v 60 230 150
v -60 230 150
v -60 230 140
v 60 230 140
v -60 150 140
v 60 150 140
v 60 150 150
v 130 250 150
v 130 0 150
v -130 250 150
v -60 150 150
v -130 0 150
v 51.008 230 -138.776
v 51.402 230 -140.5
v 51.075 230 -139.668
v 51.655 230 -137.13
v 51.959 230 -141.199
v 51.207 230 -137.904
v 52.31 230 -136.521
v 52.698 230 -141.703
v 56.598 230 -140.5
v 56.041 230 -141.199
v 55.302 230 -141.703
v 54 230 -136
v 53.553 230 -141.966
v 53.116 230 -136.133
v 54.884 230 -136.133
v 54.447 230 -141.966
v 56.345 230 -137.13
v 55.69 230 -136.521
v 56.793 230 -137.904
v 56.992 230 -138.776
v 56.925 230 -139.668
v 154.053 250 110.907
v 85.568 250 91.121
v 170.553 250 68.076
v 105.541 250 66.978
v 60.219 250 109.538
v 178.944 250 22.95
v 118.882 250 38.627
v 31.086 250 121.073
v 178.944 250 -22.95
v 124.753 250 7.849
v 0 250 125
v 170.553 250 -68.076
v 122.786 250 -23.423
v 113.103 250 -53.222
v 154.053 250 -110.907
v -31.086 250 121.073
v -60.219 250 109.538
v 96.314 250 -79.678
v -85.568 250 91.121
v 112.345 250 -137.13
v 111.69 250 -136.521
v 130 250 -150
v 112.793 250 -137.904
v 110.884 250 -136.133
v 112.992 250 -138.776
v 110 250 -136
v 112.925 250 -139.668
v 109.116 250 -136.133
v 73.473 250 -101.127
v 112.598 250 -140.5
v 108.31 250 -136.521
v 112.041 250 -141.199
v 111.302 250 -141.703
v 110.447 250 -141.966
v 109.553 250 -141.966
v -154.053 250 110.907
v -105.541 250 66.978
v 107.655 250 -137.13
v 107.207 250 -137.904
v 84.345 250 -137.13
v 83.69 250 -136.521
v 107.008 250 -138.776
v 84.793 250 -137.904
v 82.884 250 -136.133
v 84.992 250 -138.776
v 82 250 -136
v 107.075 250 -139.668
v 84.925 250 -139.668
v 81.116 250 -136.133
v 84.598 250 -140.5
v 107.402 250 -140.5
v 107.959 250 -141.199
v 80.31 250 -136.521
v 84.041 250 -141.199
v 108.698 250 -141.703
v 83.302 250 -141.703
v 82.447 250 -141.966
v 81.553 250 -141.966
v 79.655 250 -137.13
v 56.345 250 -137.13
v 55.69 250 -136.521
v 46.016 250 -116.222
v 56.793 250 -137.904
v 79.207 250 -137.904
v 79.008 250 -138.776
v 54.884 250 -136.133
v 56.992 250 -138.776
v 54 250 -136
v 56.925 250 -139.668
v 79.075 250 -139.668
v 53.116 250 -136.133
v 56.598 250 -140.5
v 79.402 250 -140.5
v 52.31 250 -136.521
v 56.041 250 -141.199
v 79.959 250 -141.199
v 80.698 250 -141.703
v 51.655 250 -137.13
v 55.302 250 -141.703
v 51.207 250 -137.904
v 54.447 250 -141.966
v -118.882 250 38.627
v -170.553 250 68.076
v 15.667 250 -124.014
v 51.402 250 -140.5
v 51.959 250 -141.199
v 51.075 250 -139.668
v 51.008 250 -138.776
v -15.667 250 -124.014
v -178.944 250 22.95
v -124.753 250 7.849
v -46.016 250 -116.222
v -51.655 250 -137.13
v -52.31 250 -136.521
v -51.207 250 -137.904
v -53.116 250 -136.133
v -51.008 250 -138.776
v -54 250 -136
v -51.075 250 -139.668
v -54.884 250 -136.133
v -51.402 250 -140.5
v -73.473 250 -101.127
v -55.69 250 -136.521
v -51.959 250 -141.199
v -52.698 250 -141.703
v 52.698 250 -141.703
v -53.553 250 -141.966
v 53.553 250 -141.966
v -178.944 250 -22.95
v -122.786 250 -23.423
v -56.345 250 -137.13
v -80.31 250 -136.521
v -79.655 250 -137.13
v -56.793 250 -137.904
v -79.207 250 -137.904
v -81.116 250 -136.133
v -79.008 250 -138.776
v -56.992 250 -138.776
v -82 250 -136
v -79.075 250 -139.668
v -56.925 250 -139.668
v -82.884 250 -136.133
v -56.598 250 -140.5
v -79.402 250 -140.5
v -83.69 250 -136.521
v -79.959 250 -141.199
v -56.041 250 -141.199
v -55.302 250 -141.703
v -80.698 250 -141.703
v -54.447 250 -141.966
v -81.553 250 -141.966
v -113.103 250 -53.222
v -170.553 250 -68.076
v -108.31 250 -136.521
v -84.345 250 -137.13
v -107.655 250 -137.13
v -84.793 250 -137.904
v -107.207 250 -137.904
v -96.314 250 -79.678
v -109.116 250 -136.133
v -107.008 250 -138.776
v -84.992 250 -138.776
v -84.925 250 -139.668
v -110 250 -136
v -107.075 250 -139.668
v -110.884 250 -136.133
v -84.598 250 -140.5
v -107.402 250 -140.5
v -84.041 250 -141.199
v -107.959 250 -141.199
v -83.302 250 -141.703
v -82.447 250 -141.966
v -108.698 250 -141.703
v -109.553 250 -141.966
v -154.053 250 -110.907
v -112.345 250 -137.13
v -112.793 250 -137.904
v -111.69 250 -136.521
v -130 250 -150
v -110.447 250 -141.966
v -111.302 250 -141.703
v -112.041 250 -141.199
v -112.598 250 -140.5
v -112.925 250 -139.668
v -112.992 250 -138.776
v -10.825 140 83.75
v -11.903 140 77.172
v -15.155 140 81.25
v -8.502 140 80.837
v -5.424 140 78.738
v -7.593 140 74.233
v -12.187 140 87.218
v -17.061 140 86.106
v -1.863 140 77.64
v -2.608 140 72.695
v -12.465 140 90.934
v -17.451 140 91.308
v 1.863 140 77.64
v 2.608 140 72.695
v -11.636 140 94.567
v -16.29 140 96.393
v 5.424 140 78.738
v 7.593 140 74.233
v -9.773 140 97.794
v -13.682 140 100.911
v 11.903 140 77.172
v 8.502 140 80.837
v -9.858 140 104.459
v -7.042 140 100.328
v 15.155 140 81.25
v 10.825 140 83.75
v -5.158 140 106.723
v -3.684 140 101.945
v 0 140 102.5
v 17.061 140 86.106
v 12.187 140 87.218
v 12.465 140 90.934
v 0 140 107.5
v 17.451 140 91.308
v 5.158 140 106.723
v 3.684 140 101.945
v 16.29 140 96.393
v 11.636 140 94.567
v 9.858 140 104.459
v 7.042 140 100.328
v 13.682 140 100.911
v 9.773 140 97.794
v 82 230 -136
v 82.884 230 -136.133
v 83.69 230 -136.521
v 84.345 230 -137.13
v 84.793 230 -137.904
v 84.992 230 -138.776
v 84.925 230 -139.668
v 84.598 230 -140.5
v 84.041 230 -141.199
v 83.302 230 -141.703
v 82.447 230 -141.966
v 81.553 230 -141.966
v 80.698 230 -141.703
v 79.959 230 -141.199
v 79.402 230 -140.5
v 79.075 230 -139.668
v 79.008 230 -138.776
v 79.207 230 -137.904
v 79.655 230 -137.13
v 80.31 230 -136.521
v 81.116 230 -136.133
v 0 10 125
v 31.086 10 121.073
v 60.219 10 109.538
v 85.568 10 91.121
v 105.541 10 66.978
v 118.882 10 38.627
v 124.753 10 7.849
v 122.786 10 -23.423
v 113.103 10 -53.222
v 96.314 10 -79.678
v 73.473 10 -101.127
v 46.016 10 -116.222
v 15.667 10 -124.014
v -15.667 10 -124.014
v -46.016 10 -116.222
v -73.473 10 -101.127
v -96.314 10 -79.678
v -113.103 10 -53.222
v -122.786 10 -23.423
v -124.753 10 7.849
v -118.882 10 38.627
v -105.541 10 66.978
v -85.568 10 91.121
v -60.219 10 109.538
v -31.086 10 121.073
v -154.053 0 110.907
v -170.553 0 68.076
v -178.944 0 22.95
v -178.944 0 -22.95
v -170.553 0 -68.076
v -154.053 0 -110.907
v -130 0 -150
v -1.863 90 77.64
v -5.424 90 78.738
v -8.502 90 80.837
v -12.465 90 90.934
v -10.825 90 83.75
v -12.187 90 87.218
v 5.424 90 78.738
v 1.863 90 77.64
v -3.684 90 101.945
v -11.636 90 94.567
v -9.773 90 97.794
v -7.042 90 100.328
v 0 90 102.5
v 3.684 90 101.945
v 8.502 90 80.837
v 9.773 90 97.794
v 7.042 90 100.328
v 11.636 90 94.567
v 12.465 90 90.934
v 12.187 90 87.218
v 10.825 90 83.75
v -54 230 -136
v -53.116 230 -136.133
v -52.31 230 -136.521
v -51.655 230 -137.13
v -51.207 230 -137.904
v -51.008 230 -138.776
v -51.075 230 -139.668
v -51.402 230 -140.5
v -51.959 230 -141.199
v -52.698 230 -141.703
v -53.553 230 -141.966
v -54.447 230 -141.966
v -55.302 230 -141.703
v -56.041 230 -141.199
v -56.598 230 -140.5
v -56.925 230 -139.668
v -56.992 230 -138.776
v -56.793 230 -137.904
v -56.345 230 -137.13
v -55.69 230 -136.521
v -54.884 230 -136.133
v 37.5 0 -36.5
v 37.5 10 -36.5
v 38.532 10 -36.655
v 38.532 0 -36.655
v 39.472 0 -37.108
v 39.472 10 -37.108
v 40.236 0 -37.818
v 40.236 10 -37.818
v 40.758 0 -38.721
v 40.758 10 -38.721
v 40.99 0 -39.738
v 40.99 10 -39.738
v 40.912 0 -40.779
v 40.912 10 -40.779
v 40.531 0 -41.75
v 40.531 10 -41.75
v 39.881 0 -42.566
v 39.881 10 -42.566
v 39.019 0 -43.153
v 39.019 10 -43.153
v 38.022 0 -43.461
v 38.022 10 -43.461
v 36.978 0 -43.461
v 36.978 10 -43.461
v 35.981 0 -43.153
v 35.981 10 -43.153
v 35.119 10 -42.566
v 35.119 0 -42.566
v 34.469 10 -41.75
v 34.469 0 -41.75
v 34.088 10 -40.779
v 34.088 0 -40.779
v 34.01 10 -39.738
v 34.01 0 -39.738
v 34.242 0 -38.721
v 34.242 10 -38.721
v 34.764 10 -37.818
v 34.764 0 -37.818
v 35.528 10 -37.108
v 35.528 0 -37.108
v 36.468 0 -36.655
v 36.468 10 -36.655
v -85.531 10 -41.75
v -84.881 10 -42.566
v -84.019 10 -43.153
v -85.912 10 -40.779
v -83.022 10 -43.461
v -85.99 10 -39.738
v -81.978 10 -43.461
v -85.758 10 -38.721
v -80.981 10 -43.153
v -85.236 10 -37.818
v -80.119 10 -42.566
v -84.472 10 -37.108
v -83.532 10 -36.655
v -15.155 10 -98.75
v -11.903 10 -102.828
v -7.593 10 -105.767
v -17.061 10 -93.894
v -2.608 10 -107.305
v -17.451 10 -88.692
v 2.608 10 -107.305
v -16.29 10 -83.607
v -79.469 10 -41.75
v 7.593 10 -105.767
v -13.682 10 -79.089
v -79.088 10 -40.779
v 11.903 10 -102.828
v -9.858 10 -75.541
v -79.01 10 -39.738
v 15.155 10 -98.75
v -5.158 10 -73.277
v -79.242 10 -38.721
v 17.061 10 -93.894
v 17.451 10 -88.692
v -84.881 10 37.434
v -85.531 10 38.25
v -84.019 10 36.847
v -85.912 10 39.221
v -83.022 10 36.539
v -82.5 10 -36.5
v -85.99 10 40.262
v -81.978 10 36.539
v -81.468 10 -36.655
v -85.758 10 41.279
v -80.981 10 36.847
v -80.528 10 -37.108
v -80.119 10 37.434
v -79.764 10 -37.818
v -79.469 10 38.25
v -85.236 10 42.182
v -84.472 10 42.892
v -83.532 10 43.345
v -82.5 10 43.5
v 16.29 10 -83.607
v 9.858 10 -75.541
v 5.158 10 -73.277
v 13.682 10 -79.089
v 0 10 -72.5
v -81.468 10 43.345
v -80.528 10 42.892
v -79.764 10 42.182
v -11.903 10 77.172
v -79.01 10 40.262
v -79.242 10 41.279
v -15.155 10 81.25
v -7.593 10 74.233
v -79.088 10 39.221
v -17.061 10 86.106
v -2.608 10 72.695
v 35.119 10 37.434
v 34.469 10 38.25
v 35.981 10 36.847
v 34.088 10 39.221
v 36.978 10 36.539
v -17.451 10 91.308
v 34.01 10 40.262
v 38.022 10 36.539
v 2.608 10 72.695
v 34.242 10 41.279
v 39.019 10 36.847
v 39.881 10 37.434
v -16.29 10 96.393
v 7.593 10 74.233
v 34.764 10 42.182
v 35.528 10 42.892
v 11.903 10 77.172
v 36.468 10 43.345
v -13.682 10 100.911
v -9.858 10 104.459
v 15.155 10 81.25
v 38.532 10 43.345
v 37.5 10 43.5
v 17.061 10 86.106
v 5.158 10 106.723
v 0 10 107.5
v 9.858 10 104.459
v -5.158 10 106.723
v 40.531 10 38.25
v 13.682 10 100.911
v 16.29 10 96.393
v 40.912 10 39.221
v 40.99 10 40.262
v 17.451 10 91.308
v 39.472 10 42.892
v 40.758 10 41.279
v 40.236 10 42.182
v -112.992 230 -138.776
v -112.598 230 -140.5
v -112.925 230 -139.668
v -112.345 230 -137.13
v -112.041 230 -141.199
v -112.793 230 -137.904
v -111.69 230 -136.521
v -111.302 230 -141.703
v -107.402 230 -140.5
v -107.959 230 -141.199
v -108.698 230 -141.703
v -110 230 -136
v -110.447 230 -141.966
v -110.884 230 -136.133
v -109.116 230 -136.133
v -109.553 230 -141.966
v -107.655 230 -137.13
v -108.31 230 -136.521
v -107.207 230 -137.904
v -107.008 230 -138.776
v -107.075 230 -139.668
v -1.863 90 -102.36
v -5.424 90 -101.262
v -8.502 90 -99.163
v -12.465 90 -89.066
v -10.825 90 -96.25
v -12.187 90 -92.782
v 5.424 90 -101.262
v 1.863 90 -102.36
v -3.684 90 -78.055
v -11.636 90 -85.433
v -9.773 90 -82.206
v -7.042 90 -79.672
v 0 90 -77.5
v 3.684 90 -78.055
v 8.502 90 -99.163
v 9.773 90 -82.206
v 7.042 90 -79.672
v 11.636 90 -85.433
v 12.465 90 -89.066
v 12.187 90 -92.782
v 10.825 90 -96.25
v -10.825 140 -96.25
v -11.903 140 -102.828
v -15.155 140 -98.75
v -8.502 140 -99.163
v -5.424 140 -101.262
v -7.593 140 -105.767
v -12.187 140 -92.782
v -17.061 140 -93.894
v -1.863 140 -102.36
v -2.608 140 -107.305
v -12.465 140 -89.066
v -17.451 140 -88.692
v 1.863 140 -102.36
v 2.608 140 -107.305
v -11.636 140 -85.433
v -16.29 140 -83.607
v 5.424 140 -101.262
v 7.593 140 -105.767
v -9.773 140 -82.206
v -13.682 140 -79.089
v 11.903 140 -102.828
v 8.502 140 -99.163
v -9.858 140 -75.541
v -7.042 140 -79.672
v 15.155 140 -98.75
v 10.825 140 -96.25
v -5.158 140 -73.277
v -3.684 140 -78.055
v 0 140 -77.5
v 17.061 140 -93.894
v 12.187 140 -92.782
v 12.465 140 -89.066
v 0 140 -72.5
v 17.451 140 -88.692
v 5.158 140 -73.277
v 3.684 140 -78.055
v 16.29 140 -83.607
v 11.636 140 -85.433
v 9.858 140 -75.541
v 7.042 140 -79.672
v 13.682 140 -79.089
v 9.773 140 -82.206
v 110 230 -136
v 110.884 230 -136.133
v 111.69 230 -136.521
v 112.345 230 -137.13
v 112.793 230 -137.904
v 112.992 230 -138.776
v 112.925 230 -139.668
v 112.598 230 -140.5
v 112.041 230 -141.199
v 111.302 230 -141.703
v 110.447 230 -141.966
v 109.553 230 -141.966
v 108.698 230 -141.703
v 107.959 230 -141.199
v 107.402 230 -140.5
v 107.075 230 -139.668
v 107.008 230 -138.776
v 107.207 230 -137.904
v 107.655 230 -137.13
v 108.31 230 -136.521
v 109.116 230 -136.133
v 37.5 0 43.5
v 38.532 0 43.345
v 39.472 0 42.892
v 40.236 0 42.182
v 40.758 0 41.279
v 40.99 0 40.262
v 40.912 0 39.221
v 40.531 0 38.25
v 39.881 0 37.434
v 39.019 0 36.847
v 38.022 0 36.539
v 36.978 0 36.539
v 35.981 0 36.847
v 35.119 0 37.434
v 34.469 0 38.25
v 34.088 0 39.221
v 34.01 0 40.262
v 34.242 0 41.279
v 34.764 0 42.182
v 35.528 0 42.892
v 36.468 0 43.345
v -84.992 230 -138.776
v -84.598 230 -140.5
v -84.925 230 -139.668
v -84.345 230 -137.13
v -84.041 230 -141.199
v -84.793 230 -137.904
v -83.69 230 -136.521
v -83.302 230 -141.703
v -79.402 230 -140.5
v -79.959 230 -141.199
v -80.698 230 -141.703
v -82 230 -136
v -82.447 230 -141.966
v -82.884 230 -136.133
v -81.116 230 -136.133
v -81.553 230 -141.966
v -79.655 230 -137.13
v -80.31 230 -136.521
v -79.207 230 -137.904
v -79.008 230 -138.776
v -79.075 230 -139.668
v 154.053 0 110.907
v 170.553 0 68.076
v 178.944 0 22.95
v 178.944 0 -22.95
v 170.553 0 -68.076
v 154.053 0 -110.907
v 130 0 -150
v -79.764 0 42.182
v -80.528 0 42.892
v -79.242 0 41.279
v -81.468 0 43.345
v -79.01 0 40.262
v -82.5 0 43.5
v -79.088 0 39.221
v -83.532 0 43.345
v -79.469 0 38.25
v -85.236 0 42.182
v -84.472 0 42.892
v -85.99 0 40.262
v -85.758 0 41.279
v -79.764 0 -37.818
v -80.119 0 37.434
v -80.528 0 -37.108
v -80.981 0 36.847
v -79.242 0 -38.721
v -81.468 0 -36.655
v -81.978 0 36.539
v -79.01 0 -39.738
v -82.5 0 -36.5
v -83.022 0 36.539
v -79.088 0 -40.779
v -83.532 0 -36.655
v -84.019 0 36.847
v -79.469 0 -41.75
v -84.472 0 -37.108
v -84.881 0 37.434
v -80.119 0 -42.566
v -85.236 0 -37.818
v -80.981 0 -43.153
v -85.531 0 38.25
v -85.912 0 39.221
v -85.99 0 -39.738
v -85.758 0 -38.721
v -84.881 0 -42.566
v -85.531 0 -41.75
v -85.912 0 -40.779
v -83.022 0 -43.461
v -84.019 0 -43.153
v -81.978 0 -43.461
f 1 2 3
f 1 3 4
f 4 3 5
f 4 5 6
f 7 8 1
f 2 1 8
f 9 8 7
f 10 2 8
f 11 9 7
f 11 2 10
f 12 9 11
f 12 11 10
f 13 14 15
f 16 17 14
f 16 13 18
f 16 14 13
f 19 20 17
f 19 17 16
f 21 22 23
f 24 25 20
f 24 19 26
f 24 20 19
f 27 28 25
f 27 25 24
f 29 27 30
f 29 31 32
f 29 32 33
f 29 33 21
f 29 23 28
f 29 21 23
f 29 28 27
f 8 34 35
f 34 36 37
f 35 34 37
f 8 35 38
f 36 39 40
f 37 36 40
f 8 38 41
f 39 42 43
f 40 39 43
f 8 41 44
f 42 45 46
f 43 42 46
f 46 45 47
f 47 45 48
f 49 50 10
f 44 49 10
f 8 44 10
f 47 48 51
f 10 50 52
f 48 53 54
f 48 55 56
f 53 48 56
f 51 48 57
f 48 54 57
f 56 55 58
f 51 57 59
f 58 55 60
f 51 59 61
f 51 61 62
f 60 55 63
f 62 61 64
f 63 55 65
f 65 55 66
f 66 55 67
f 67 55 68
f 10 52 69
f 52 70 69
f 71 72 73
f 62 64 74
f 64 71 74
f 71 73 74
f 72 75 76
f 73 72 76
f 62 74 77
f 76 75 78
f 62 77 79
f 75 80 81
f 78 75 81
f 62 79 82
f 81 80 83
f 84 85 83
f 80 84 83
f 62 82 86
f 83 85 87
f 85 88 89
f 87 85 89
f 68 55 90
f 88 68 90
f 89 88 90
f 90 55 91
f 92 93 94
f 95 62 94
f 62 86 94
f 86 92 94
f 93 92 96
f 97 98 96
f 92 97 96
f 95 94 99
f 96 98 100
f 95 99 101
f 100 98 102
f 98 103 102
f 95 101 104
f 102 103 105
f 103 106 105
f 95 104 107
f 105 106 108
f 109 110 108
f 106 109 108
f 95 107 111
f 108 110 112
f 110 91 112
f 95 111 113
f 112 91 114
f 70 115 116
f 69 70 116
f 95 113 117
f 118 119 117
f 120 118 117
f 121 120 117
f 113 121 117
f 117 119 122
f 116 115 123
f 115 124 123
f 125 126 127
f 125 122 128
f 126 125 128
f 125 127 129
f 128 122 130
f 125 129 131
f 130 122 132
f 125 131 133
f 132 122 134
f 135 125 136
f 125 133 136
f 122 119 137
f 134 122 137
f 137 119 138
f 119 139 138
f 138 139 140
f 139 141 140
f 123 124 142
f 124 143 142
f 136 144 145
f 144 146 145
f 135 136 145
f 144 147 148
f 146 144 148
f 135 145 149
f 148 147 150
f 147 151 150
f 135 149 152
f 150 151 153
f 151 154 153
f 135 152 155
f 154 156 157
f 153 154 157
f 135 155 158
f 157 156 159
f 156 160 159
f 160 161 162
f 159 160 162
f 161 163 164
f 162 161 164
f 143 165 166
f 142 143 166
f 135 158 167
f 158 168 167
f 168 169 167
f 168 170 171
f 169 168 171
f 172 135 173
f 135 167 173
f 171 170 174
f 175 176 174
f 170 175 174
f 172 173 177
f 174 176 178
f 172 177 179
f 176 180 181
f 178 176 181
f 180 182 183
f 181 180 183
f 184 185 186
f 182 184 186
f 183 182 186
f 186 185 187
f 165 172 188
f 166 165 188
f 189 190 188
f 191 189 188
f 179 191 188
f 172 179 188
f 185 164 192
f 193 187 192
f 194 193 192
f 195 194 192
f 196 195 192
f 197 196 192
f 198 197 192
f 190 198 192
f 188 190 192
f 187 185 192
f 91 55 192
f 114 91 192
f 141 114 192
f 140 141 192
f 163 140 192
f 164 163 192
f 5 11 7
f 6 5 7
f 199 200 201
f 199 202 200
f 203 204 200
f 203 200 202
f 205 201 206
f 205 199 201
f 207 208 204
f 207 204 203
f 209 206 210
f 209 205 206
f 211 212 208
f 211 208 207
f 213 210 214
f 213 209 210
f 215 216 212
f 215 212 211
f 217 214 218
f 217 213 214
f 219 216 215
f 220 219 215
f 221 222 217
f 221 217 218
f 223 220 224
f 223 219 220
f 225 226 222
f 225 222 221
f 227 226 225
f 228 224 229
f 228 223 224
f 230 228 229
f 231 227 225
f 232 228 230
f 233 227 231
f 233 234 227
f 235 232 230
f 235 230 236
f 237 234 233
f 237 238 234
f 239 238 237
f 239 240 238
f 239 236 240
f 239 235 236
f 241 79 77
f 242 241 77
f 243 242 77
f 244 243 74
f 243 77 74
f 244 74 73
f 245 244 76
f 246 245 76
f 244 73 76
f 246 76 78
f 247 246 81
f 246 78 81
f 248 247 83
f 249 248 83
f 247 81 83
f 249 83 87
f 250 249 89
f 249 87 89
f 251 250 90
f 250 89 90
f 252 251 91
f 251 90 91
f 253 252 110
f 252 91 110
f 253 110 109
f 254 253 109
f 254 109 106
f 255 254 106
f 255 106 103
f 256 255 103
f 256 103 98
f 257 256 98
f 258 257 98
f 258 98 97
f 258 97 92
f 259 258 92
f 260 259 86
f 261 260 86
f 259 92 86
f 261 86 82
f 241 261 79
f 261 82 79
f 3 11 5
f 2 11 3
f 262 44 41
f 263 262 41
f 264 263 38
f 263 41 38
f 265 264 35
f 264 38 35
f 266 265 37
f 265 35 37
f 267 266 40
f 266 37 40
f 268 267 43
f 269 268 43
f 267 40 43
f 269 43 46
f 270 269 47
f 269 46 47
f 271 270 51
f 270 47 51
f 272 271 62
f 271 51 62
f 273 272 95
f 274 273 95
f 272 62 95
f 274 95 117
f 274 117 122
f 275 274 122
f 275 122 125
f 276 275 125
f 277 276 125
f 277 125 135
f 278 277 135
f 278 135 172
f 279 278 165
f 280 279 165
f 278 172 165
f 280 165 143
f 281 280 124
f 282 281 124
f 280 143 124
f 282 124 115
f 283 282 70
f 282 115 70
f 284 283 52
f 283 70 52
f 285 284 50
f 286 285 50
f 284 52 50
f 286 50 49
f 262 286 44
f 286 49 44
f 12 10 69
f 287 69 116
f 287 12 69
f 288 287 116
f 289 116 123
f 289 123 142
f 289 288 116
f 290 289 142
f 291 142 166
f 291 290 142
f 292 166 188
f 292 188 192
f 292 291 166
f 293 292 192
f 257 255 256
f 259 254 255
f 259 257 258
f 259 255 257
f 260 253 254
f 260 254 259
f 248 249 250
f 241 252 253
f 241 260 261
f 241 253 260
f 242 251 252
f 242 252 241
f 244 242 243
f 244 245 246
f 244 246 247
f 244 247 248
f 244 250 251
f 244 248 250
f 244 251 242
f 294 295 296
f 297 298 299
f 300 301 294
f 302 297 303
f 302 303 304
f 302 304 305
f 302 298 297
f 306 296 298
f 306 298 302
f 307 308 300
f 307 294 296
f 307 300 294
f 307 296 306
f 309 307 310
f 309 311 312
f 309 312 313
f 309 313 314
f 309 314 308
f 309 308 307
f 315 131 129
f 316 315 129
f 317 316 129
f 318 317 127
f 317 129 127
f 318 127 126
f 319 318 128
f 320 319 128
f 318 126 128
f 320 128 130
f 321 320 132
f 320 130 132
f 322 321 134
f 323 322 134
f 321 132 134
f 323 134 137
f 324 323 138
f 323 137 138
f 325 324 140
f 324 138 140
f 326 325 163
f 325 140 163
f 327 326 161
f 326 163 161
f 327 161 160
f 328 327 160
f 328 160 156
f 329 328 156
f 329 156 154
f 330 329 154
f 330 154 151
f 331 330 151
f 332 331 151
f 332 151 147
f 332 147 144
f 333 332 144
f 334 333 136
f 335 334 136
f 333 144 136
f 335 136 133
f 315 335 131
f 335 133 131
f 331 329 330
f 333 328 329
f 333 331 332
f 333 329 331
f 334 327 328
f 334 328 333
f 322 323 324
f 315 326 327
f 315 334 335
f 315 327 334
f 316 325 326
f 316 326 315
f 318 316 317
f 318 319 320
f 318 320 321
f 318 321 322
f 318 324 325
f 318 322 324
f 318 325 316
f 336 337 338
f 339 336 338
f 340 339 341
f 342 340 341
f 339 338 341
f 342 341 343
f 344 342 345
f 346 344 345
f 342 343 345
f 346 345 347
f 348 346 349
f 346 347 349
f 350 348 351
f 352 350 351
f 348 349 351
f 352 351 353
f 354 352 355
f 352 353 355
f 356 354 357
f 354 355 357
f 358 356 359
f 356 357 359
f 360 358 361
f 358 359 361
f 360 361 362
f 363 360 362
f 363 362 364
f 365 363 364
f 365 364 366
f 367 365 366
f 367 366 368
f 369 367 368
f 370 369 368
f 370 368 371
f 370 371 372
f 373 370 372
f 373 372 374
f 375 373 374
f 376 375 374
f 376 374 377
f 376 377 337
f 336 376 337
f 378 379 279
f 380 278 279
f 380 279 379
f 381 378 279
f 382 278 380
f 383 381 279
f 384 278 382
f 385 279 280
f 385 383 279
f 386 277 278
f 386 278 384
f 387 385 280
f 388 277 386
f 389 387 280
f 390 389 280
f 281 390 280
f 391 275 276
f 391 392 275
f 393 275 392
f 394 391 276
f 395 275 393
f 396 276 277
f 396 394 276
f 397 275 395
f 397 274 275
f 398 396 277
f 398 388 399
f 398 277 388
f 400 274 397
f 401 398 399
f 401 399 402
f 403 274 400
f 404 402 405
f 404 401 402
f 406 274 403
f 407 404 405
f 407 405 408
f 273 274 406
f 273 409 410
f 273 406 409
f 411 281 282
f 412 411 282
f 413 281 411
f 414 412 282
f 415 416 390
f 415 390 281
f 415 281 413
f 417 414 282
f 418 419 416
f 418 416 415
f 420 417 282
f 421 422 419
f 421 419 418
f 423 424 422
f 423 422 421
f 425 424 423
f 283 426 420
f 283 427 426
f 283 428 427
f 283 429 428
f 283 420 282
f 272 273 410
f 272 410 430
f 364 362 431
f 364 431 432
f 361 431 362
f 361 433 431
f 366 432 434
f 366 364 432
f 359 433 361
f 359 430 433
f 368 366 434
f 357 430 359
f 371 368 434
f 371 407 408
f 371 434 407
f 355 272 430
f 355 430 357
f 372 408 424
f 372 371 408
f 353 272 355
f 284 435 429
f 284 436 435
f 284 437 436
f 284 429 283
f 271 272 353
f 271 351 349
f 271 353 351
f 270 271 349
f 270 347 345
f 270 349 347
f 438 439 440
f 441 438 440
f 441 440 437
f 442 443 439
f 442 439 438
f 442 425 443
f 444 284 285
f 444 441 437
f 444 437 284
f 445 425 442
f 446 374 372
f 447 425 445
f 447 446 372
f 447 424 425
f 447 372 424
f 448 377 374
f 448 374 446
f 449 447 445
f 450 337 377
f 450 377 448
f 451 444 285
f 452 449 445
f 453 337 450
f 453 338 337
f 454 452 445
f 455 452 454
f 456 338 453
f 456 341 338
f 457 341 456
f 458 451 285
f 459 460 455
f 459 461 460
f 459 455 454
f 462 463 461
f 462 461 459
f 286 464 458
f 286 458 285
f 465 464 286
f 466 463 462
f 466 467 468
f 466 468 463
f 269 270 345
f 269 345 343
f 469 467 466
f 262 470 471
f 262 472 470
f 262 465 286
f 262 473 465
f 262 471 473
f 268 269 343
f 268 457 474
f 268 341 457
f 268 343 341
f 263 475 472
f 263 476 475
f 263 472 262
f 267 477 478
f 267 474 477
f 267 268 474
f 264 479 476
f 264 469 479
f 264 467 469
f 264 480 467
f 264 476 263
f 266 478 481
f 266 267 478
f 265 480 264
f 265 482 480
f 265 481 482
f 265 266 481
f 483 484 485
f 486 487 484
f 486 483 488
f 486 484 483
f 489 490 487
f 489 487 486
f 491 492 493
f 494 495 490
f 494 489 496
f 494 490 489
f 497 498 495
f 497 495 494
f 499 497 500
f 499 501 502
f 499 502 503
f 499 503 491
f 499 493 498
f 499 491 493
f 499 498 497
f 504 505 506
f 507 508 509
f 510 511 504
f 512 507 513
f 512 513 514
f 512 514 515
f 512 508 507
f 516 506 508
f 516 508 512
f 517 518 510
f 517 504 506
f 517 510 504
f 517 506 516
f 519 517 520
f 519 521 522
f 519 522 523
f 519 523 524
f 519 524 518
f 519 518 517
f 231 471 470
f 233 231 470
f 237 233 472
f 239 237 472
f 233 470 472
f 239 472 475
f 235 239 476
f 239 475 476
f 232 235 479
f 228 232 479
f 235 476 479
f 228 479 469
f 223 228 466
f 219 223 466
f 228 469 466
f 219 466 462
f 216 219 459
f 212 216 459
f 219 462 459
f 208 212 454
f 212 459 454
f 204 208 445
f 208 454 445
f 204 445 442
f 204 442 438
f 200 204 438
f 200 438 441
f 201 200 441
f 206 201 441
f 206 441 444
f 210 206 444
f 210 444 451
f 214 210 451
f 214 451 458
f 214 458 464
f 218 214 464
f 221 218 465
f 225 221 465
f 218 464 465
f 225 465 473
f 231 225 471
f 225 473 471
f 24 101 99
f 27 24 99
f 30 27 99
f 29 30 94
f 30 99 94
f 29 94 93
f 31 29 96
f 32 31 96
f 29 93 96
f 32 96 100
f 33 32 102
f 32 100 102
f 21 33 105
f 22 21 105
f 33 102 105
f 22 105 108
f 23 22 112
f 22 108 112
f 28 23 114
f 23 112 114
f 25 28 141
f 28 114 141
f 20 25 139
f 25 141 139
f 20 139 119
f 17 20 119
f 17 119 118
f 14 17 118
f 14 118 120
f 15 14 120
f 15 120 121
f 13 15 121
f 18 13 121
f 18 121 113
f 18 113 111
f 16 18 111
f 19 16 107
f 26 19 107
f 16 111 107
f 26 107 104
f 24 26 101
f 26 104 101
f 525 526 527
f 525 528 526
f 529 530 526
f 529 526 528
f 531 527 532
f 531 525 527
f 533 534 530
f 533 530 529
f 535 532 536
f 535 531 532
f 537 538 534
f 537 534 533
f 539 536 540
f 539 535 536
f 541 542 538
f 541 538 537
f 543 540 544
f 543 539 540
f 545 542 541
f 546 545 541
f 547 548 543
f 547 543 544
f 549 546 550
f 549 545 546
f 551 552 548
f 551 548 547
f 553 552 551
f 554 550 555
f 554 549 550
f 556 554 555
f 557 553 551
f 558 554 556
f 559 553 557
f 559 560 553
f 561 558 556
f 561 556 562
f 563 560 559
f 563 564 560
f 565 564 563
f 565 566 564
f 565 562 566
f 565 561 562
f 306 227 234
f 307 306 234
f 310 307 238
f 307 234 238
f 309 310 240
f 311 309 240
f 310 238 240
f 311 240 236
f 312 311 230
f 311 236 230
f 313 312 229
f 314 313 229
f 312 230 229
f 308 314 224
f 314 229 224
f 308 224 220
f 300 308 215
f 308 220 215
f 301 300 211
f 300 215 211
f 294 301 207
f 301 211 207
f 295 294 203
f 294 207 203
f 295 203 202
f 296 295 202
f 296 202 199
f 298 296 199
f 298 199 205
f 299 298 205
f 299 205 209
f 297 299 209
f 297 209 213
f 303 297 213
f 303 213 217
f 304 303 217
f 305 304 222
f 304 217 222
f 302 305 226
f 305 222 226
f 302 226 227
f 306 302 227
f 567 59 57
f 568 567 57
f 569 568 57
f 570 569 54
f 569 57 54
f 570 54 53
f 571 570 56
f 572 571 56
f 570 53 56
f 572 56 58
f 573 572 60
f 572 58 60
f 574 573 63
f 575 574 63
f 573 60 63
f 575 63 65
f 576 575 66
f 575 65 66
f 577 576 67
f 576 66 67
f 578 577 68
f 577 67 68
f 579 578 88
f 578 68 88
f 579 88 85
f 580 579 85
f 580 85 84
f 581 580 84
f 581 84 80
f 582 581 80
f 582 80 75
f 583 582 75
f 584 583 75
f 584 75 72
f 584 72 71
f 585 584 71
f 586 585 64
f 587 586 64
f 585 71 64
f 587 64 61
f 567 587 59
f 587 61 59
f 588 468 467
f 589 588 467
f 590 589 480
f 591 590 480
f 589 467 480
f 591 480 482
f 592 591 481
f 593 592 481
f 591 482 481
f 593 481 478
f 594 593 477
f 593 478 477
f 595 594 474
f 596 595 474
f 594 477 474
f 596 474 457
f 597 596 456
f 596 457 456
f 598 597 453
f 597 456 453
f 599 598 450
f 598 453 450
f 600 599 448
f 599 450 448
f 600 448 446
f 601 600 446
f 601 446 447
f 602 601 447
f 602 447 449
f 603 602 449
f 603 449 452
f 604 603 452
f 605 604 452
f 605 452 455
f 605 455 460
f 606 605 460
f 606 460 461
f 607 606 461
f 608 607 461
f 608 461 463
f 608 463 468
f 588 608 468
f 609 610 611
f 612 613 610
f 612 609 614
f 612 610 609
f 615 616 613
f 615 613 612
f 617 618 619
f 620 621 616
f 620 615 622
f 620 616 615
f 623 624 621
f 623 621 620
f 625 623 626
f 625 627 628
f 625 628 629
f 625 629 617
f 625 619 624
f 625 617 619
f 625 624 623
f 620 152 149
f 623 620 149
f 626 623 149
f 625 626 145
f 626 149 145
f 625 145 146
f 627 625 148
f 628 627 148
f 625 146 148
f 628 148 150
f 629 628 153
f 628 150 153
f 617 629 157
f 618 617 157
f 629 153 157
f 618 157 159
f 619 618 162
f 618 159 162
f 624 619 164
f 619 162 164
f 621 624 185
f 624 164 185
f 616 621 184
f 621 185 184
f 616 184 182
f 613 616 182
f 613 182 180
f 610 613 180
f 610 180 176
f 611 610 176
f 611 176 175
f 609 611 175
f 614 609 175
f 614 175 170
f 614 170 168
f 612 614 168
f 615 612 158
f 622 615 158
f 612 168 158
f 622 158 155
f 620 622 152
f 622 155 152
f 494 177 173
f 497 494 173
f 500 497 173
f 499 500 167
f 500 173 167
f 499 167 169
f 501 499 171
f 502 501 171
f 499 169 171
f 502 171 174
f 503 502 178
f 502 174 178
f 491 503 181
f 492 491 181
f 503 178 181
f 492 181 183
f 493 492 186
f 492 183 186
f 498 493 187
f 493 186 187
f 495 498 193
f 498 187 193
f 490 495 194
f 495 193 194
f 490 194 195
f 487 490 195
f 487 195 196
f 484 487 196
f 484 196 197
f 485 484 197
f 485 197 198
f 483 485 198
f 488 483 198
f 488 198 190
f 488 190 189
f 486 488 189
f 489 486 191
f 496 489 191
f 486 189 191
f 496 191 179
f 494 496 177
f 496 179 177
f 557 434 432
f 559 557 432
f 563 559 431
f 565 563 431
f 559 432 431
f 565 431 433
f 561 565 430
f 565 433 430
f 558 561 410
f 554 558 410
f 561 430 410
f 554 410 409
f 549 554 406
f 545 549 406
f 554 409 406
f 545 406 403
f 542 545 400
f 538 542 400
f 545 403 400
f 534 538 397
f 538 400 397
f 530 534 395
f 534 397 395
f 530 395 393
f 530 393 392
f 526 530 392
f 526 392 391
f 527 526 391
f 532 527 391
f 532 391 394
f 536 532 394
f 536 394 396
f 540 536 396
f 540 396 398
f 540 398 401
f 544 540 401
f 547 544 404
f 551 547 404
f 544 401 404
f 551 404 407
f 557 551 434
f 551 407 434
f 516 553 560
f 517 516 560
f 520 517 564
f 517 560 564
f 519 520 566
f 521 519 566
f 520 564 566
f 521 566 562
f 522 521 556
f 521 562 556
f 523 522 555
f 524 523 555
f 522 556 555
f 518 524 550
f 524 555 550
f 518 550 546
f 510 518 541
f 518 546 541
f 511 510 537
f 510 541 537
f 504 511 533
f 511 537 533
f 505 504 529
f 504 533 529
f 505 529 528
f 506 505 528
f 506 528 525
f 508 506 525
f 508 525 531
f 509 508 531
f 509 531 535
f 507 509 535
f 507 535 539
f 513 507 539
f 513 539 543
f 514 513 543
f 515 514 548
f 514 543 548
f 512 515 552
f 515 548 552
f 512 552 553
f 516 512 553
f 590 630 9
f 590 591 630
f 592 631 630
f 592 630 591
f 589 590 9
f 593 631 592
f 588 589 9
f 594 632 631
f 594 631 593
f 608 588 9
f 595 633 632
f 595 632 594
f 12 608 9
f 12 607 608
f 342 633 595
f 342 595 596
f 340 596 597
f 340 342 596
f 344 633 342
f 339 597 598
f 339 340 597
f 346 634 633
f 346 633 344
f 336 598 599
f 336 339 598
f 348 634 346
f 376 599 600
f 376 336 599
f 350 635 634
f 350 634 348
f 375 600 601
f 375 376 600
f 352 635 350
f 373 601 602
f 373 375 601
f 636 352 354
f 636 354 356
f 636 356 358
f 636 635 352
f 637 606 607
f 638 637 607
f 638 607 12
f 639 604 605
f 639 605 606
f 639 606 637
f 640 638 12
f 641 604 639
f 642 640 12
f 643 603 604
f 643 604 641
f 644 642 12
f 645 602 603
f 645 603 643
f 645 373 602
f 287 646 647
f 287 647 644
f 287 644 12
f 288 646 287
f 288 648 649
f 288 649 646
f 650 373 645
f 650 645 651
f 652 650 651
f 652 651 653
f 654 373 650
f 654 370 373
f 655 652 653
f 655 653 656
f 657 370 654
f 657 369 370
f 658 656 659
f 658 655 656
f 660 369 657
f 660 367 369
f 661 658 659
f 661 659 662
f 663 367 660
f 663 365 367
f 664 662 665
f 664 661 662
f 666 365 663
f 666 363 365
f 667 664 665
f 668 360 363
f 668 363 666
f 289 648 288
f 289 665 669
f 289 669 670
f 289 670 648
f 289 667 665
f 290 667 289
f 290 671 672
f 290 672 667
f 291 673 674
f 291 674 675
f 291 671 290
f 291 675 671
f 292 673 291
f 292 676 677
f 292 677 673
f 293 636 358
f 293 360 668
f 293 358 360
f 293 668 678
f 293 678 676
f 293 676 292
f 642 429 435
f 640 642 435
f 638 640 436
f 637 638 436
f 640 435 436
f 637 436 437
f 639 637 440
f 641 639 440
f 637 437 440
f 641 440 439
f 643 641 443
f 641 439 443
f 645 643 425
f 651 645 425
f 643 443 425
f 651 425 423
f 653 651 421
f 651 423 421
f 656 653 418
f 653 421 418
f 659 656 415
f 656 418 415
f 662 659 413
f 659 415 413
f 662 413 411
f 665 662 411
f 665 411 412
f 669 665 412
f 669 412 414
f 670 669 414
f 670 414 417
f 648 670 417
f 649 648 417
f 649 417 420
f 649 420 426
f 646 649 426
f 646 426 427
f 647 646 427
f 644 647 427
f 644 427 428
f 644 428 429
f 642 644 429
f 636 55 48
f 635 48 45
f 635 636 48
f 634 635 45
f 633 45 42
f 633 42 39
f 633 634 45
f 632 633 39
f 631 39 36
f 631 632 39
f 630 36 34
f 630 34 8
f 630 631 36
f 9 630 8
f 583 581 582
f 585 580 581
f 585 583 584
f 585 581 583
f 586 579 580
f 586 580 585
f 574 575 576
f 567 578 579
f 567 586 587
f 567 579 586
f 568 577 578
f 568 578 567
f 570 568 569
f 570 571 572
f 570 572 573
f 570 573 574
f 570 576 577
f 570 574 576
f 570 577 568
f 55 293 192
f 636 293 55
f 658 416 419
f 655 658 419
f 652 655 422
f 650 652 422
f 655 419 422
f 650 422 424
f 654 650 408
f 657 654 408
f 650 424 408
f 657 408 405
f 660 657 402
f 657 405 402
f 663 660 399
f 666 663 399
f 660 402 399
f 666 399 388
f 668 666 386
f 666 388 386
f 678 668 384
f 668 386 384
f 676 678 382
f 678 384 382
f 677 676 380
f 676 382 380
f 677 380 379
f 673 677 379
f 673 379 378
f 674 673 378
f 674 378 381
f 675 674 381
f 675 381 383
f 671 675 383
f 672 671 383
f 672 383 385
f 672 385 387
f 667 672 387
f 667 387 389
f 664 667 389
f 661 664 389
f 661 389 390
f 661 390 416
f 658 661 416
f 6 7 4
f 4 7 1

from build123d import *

# Parameters (mm, degrees)
BOSS_EXTRUDE1_DEPTH      = 250
INSIDE_COMPARTMENT_R     = 125
CUT_EXTRUDE1_DEPTH       = 240
LCD_W                    = 120
LCD_H                    = 80
CUT_EXTRUDE2_DEPTH       = 10
HINGE_HOLES_R            = 3
CUT_EXTRUDE3_DEPTH       = 20
POWER_SUPPLY_HOLES_R     = 3.5
CUT_EXTRUDE4_DEPTH       = 336.410196625
POLES_FOR_MIDDLE_LAYER_R = 17.5
BOSS_EXTRUDE2_DEPTH      = 130
HOLES_FOR_POLES_R        = 12.5
CUT_EXTRUDE6_DEPTH       = 50


with BuildPart() as part:
    # Case 2 → Boss-Extrude1 (new body)
    with BuildSketch(Plane(origin=(0, 0, 0), x_dir=(1, 0, 0), z_dir=(0, 1, 0))):
        with BuildLine():
            Line((-130, 150), (130, 150))
            ThreePointArc((130, 150), (180, 0), (130, -150))
            Line((130, -150), (-130, -150))
            ThreePointArc((-130, -150), (-180, 0), (-130, 150))
        make_face()
    extrude(amount=BOSS_EXTRUDE1_DEPTH)

    # Inside Compartment → Cut-Extrude1 (cut)
    with BuildSketch(Plane(origin=(0, 250, 0), x_dir=(1, 0, 0), z_dir=(0, 1, 0))):
        with Locations(Location((0, 0, 0), (0, 0, 270))):
            Circle(INSIDE_COMPARTMENT_R)
    extrude(amount=-CUT_EXTRUDE1_DEPTH, mode=Mode.SUBTRACT)

    # LCD → Cut-Extrude2 (cut)
    with BuildSketch(Plane.XY.offset(150)):
        with Locations((0, 190)):
            Rectangle(LCD_W, LCD_H)
    extrude(amount=-CUT_EXTRUDE2_DEPTH, mode=Mode.SUBTRACT)

    # Hinge holes → Cut-Extrude3 (cut)
    with BuildSketch(Plane(origin=(0, 250, 0), x_dir=(1, 0, 0), z_dir=(0, 1, 0))):
        with Locations(Location((-110, 139, 0), (0, 0, 270))):
            Circle(HINGE_HOLES_R)
        with Locations(Location((-82, 139, 0), (0, 0, 270))):
            Circle(HINGE_HOLES_R)
        with Locations(Location((-54, 139, 0), (0, 0, 270))):
            Circle(HINGE_HOLES_R)
        with Locations(Location((54, 139, 0), (0, 0, 270))):
            Circle(HINGE_HOLES_R)
        with Locations(Location((82, 139, 0), (0, 0, 270))):
            Circle(HINGE_HOLES_R)
        with Locations(Location((110, 139, 0), (0, 0, 270))):
            Circle(HINGE_HOLES_R)
    extrude(amount=-CUT_EXTRUDE3_DEPTH, mode=Mode.SUBTRACT)

    # Power supply holes → Cut-Extrude4 (cut, through all)
    with BuildSketch(Plane(origin=(0, 10, 0), x_dir=(1, 0, 0), z_dir=(0, 1, 0))):
        with Locations(Location((-82.5, 40, 0), (0, 0, 270))):
            Circle(POWER_SUPPLY_HOLES_R)
        with Locations(Location((37.5, 40, 0), (0, 0, 270))):
            Circle(POWER_SUPPLY_HOLES_R)
        with Locations(Location((37.5, -40, 0), (0, 0, 270))):
            Circle(POWER_SUPPLY_HOLES_R)
        with Locations(Location((-82.5, -40, 0), (0, 0, 270))):
            Circle(POWER_SUPPLY_HOLES_R)
    extrude(amount=-CUT_EXTRUDE4_DEPTH, mode=Mode.SUBTRACT)

    # Poles for middle layer → Boss-Extrude2 (add)
    with BuildSketch(Plane(origin=(0, 10, 0), x_dir=(1, 0, 0), z_dir=(0, 1, 0))):
        with Locations(Location((0, 90, 0), (0, 0, 270))):
            Circle(POLES_FOR_MIDDLE_LAYER_R)
        with Locations(Location((0, -90, 0), (0, 0, 270))):
            Circle(POLES_FOR_MIDDLE_LAYER_R)
    extrude(amount=BOSS_EXTRUDE2_DEPTH)

    # Holes for poles → Cut-Extrude6 (cut)
    with BuildSketch(Plane(origin=(0, 140, 0), x_dir=(1, 0, 0), z_dir=(0, 1, 0))):
        with Locations(Location((0, -90, 0), (0, 0, 270))):
            Circle(HOLES_FOR_POLES_R)
        with Locations(Location((0, 90, 0), (0, 0, 270))):
            Circle(HOLES_FOR_POLES_R)
    extrude(amount=-CUT_EXTRUDE6_DEPTH, mode=Mode.SUBTRACT)


solid = part.part
